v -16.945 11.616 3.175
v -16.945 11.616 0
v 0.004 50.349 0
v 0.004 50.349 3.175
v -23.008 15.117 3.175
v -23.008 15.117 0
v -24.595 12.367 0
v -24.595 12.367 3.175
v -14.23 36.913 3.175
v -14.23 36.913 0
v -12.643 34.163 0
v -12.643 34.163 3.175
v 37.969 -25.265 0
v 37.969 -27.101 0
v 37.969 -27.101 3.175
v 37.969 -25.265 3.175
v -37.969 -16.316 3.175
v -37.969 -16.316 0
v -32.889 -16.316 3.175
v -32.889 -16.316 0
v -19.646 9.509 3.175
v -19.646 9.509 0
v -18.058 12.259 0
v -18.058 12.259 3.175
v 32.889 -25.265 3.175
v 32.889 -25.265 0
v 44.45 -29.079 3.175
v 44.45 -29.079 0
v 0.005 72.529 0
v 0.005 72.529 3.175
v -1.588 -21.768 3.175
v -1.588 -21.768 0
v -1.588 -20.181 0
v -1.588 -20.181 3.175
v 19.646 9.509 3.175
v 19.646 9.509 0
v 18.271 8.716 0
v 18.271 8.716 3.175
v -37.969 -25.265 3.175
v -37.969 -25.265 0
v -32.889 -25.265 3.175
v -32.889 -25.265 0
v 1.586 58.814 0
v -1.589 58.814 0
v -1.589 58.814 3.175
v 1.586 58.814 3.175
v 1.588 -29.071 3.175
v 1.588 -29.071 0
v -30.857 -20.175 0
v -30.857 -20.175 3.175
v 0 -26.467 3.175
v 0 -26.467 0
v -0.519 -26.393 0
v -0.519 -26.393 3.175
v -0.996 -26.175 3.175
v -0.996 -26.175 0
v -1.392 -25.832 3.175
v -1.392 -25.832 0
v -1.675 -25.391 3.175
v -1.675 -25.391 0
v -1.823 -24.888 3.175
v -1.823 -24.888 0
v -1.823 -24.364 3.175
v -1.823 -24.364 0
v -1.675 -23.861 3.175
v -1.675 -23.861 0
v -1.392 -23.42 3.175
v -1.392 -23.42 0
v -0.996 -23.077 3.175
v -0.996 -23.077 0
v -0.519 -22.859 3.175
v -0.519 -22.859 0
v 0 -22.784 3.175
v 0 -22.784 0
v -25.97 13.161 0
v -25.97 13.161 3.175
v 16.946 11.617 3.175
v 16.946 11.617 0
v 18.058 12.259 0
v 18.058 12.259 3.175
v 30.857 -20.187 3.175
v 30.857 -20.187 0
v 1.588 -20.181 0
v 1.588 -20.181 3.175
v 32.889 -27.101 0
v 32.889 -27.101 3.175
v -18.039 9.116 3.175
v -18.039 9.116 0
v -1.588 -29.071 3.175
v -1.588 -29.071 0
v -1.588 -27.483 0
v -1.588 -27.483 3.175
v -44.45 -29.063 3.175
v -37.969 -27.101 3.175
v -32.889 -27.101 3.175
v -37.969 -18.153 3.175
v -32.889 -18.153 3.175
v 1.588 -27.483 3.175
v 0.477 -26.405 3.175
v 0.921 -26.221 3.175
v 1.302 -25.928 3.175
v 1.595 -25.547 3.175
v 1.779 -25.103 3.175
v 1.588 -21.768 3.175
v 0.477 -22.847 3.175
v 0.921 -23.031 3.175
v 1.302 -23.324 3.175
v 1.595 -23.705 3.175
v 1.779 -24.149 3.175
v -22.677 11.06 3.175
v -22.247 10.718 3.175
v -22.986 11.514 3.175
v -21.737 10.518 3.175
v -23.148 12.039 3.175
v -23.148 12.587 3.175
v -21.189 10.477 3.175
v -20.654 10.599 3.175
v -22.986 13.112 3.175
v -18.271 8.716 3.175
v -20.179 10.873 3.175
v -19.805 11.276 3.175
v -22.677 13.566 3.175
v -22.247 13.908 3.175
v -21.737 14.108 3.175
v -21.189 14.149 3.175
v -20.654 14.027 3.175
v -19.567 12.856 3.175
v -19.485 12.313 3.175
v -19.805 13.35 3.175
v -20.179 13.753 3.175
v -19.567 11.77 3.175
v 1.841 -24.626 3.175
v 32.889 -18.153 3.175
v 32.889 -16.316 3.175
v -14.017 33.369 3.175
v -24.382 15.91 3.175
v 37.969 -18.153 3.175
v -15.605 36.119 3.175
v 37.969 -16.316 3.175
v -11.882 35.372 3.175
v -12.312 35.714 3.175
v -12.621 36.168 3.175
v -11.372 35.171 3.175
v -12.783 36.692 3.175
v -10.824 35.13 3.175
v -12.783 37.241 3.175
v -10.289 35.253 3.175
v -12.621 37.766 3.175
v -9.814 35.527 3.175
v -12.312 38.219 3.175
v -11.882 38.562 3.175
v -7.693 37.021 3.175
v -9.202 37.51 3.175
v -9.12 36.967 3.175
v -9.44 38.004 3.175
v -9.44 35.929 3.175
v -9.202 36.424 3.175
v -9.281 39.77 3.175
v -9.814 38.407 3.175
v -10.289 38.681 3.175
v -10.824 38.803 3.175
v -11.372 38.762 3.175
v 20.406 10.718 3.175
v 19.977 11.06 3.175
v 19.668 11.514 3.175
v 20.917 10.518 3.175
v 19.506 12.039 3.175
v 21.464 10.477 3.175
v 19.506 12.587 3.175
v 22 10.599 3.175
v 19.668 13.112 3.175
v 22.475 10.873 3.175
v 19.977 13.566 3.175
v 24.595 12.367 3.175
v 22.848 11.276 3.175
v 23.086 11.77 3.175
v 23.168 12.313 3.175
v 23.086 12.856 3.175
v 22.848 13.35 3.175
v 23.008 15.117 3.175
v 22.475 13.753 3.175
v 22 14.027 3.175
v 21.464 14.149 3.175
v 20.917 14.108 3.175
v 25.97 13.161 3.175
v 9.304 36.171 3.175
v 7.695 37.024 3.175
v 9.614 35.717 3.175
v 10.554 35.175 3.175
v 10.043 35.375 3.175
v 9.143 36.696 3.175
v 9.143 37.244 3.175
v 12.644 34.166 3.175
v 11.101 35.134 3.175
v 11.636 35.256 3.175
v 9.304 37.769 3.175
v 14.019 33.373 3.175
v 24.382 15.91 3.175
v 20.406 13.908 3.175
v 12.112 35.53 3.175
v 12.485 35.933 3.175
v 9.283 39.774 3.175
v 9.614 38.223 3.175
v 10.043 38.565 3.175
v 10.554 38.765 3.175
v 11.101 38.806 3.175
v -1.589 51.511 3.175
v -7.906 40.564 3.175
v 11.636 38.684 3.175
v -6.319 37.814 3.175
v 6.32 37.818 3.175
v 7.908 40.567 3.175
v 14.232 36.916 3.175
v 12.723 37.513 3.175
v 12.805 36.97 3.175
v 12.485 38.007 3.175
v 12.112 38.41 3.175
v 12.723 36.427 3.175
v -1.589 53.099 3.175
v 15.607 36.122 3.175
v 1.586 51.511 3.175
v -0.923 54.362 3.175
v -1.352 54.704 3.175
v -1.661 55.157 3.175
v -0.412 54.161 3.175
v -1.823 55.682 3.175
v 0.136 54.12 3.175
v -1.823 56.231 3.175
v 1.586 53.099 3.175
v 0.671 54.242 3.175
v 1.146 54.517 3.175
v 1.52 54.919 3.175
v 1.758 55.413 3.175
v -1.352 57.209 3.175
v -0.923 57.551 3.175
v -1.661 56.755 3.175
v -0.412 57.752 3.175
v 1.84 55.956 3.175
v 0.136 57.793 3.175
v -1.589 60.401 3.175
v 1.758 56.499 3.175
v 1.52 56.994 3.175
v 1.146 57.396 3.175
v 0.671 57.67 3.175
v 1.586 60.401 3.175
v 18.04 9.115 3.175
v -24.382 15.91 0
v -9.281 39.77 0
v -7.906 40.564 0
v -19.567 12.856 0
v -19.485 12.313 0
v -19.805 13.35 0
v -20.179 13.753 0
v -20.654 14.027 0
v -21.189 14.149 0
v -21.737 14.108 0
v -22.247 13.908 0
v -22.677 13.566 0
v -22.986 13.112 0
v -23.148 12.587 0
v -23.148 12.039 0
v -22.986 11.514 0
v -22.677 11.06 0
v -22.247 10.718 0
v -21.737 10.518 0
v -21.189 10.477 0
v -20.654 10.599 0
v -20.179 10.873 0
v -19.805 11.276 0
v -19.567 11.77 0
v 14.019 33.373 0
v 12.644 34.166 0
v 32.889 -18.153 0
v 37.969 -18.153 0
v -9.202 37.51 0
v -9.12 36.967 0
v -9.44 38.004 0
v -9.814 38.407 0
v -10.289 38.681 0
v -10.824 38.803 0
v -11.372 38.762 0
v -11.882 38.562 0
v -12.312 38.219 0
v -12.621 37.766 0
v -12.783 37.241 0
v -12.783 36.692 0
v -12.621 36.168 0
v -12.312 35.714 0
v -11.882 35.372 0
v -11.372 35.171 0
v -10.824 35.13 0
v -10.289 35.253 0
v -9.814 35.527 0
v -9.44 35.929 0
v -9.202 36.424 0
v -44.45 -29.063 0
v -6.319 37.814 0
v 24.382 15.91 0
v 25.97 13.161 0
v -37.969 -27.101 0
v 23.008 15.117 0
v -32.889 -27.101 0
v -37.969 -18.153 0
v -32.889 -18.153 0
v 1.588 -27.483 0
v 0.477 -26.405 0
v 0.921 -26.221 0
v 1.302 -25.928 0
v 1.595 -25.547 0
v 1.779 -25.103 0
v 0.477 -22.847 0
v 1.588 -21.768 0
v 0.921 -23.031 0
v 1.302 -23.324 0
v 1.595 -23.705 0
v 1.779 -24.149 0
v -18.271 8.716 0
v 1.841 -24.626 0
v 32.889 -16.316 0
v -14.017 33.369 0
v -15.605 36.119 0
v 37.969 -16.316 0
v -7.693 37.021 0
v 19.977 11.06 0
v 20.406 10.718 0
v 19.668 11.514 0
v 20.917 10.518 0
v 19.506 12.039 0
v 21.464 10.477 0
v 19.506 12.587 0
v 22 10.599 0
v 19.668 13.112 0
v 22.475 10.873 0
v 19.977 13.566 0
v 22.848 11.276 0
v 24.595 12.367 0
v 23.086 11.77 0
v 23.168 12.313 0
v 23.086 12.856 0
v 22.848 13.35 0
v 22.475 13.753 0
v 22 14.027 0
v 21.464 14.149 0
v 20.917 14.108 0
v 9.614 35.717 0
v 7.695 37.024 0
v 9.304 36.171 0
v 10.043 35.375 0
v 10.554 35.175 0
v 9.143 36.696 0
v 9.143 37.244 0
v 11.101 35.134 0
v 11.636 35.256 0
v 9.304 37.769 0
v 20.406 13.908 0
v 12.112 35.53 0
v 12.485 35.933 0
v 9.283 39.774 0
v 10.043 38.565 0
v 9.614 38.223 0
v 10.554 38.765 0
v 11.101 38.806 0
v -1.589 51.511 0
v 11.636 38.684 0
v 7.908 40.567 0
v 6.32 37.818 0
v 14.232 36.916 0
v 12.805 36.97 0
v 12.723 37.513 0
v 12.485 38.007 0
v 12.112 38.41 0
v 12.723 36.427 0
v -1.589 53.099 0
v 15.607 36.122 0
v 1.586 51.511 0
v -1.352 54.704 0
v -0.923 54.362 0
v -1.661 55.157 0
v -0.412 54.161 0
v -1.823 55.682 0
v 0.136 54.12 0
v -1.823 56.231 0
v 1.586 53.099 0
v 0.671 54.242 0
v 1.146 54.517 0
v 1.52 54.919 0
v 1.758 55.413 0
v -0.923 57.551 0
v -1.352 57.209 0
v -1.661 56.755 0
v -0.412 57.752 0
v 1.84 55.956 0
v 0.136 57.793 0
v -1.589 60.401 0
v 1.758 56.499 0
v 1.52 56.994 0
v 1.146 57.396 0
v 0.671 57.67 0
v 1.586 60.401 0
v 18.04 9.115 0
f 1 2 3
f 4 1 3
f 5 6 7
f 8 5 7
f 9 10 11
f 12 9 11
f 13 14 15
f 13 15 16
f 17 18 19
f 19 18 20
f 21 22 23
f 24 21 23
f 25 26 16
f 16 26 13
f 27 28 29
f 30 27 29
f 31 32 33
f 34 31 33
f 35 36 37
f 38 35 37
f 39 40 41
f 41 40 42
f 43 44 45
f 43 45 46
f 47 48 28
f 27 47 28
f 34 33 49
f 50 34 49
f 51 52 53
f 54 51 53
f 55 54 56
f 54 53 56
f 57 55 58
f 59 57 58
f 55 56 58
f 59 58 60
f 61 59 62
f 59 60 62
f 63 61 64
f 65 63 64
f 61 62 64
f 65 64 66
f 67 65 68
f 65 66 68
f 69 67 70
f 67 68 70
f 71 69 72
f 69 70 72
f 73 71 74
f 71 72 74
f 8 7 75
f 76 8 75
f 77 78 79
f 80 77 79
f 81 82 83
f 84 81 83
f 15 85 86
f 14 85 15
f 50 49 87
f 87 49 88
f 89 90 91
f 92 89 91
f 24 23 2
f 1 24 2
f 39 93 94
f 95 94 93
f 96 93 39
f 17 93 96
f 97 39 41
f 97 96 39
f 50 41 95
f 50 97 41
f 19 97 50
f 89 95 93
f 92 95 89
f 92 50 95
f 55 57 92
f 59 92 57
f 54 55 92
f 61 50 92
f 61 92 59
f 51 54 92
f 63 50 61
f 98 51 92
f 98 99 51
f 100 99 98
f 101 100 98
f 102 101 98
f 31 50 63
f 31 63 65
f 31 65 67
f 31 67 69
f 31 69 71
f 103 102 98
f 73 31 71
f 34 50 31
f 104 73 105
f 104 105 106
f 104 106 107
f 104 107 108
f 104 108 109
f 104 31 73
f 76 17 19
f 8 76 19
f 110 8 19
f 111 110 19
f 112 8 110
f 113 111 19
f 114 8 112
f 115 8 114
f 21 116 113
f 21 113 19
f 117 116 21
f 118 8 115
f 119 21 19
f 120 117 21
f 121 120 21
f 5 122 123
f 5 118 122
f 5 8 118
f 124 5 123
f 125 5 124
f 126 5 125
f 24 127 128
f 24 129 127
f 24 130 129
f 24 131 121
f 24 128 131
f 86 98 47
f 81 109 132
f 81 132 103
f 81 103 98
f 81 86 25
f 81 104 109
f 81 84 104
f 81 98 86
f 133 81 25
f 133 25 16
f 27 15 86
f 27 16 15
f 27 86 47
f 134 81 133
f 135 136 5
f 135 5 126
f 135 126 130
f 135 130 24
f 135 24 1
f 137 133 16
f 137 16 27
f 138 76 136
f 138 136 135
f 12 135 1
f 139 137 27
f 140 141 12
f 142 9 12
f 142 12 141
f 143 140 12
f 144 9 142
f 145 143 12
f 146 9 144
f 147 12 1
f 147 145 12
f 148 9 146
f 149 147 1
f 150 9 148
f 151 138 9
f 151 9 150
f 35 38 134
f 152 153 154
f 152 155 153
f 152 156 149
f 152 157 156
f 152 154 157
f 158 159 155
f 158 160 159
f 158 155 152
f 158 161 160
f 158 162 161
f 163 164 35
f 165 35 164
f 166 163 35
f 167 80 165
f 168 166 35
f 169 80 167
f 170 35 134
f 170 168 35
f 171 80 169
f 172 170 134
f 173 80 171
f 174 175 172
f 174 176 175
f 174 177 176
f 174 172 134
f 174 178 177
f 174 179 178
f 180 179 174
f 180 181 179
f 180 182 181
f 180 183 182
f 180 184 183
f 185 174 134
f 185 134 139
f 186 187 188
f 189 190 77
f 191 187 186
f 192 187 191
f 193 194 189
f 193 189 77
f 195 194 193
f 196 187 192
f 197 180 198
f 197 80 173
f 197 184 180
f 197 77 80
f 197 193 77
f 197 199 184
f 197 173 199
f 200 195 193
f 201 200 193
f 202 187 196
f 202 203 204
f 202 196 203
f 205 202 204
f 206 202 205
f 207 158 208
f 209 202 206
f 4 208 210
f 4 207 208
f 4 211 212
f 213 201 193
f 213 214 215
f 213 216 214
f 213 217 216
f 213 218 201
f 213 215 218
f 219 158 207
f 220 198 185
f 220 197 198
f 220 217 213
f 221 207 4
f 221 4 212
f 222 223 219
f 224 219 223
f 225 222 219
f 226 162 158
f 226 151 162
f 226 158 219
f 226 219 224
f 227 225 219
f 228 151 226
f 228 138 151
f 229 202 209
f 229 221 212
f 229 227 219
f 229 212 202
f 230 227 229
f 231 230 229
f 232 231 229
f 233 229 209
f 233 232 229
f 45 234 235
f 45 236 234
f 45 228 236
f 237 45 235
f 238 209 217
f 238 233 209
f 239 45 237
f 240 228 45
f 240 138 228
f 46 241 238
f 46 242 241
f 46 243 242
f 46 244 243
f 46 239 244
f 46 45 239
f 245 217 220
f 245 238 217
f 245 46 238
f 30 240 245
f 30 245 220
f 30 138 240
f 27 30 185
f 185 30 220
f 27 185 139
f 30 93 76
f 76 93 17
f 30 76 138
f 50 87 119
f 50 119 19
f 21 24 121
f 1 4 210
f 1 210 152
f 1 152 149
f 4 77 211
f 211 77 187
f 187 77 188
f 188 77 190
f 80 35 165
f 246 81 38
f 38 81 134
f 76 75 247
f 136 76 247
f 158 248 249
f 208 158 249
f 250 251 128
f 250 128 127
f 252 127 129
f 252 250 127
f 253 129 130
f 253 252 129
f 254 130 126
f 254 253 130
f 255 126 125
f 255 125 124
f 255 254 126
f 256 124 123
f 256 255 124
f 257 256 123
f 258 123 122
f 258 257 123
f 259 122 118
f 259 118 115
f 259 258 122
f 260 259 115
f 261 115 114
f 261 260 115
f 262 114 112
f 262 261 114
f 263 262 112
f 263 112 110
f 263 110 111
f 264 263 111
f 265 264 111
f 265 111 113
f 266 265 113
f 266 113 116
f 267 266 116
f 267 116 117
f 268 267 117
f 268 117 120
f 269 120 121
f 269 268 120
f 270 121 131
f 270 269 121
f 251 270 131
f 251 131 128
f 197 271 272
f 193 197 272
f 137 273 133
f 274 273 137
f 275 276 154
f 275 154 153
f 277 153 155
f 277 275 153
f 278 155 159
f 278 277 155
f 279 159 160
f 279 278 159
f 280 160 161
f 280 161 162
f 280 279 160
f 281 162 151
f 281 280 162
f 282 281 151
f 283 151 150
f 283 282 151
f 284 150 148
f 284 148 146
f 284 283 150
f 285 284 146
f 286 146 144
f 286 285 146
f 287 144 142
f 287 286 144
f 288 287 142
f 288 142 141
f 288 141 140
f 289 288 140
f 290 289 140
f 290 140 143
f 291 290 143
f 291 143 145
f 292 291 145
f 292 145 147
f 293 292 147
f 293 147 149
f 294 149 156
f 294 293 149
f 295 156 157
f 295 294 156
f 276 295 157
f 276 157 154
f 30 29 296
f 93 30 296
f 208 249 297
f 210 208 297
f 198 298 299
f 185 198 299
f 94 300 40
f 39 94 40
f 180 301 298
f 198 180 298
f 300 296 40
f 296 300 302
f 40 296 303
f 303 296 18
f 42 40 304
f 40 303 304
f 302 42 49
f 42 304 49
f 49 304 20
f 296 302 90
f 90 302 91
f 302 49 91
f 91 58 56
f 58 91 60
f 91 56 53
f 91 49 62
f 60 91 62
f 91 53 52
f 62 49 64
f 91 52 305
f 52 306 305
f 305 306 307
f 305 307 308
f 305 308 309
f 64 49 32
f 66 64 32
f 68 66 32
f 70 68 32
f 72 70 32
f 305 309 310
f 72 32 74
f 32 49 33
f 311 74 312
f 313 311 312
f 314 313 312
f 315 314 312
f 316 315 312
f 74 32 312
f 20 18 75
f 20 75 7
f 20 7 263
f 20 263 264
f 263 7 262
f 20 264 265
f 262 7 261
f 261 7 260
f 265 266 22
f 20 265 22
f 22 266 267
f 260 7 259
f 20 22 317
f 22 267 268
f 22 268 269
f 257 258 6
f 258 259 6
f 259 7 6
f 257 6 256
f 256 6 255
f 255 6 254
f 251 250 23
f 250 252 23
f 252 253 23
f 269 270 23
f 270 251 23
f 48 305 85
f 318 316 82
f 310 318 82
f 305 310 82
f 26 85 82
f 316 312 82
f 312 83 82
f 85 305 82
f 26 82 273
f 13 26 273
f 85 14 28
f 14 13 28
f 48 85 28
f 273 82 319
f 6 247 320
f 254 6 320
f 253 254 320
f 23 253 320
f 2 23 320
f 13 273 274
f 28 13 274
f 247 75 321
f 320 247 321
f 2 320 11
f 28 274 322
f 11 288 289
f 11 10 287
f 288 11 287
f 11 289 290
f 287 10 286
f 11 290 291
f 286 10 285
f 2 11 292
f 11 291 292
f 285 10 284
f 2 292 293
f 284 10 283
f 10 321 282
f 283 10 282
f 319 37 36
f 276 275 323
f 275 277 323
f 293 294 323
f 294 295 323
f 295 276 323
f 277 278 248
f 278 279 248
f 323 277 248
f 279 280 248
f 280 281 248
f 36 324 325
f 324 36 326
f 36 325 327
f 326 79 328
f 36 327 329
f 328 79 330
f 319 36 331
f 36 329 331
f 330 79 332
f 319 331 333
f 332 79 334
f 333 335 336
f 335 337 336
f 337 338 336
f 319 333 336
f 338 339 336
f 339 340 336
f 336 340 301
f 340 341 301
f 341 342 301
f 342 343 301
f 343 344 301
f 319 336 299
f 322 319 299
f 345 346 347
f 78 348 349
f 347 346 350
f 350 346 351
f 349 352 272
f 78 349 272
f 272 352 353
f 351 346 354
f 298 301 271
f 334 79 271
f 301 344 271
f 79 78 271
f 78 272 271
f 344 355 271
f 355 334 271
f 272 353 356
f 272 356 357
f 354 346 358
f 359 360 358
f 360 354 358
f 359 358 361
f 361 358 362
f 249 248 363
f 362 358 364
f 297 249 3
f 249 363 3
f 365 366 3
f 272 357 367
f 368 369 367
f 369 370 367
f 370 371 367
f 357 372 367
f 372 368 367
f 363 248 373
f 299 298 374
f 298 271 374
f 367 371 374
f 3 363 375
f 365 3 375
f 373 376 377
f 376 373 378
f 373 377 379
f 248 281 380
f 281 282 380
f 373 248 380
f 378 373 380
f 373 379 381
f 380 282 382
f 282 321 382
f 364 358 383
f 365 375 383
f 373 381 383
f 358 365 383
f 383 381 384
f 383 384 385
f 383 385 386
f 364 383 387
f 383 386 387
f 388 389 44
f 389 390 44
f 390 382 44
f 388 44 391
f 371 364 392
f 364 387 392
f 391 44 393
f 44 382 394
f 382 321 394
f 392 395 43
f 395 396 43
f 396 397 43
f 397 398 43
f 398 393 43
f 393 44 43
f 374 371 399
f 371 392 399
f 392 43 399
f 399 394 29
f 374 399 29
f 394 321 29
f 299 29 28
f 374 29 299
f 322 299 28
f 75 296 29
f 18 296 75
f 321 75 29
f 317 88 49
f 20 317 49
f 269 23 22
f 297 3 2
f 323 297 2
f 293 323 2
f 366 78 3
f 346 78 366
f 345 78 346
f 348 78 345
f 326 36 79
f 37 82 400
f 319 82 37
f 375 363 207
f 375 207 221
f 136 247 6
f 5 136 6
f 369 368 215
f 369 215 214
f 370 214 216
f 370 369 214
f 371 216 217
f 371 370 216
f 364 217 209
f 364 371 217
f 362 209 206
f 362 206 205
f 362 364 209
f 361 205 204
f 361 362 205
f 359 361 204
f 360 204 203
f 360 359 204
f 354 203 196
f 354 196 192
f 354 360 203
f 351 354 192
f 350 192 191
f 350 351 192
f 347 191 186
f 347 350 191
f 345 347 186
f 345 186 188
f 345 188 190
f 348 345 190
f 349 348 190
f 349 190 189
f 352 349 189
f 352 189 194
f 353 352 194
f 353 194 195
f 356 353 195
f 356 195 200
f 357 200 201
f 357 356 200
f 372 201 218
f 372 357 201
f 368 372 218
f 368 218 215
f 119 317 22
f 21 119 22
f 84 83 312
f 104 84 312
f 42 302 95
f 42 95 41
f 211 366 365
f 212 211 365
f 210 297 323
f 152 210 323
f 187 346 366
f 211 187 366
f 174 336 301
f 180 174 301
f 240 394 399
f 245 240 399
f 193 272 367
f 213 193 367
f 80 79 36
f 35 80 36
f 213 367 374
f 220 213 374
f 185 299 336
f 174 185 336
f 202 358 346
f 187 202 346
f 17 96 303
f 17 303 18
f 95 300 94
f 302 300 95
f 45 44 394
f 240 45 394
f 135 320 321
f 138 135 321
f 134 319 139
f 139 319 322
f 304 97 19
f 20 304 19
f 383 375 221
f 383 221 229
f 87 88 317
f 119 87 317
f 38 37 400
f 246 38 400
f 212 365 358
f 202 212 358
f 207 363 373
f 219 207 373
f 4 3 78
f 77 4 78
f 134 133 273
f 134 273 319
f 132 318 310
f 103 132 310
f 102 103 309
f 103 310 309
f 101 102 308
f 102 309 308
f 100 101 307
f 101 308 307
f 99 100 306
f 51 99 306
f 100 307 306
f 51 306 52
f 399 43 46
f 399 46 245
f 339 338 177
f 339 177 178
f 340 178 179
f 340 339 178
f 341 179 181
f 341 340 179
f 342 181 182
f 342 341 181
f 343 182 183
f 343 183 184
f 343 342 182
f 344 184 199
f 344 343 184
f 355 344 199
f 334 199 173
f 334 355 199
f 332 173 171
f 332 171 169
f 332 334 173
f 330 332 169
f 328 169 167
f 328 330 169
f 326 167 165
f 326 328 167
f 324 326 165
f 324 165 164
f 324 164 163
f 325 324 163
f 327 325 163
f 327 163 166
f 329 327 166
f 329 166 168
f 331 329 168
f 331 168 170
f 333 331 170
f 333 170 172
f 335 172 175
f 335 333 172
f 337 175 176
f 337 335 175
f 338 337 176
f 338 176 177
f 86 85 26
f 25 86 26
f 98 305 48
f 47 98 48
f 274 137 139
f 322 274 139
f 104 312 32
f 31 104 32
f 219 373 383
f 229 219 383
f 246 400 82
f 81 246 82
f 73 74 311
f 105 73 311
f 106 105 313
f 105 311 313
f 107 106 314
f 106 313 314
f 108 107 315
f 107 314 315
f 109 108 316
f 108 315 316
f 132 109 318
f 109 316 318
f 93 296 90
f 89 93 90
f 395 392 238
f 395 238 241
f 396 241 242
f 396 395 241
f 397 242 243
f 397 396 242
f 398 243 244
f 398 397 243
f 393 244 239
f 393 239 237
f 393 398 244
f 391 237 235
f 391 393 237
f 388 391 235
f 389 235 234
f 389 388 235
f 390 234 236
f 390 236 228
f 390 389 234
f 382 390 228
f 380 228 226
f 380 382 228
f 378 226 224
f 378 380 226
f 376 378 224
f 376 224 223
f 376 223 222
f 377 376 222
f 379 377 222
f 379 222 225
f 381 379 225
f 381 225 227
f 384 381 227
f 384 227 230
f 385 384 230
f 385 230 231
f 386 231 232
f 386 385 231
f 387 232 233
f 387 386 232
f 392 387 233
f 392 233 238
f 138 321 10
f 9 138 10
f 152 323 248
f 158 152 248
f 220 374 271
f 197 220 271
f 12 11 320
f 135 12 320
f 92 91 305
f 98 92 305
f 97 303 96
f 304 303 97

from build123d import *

# Parameters (mm, degrees)
F0_W     = 5.08
F0_H     = 1.836467
F0_H_2   = 1.836468
F0_R     = 1.8415
F0_W_2   = 3.175
F0_H_3   = 1.5875
F1_DEPTH = 3.175


with BuildPart() as f1:
    # F0 (on Top) → F1 (new body)
    with BuildSketch(Plane.XY):
        Polygon((1.5875, -29.071287), (44.449999, -29.079242), (0.005395, 72.529008), (-44.449999, -29.062744), (-1.5875, -29.070698), (-1.5875, -27.483493), (0, -27.483493), (1.5875, -27.483493), align=None)
        with Locations((-35.429051, -26.18307)):
            Rectangle(F0_W, F0_H, mode=Mode.SUBTRACT)
        with Locations((-35.429051, -17.234603)):
            Rectangle(F0_W, F0_H_2, mode=Mode.SUBTRACT)
        with BuildLine():
            ThreePointArc((1.8415, -24.625993), (1.302137, -25.92813), (0, -26.467493))
            ThreePointArc((0, -26.467493), (-1.8415, -24.625993), (0, -22.784493))
            ThreePointArc((0, -22.784493), (1.302137, -23.323855), (1.8415, -24.625993))
        make_face(mode=Mode.SUBTRACT)
        Polygon((-24.382213, 15.910164), (-23.007653, 15.116562), (-24.595153, 12.366931), (-25.969713, 13.160534), align=None, mode=Mode.SUBTRACT)
        with Locations((-21.326735, 12.312996)):
            Circle(F0_R, mode=Mode.SUBTRACT)
        Polygon((1.5875, -21.768493), (0, -21.768493), (-1.5875, -21.768493), (-1.5875, -20.180698), (-30.857051, -20.175266), (-18.039491, 9.116081), (-18.270747, 8.715534), (-19.645818, 9.509431), (-18.058318, 12.259062), (-16.945342, 11.616485), (0.003745, 50.349411), (16.945842, 11.616773), (18.058318, 12.259062), (19.645818, 9.509431), (18.270747, 8.715534), (18.040242, 9.11478), (30.857051, -20.186719), (1.5875, -20.181287), align=None, mode=Mode.SUBTRACT)
        with Locations((35.429051, -26.18307)):
            Rectangle(F0_W, F0_H, mode=Mode.SUBTRACT)
        with Locations((35.429051, -17.234603)):
            Rectangle(F0_W, F0_H_2, mode=Mode.SUBTRACT)
        with Locations((21.326735, 12.312996)):
            Circle(F0_R, mode=Mode.SUBTRACT)
        Polygon((25.969713, 13.160534), (24.595153, 12.366931), (23.007653, 15.116562), (24.382213, 15.910164), align=None, mode=Mode.SUBTRACT)
        Polygon((-12.642652, 34.163247), (-14.017468, 33.369497), (-15.604968, 36.119127), (-14.230152, 36.912878), align=None, mode=Mode.SUBTRACT)
        with Locations((-10.961735, 36.966812)):
            Circle(F0_R, mode=Mode.SUBTRACT)
        Polygon((-6.318502, 37.814497), (-7.693317, 37.020747), (-9.280817, 39.770378), (-7.906002, 40.564128), align=None, mode=Mode.SUBTRACT)
        with Locations((-0.001844, 52.305038)):
            Rectangle(F0_W_2, F0_H_3, mode=Mode.SUBTRACT)
        with Locations((-0.001844, 55.956288)):
            Circle(F0_R, mode=Mode.SUBTRACT)
        with Locations((-0.001844, 59.607538)):
            Rectangle(F0_W_2, F0_H_3, mode=Mode.SUBTRACT)
        with Locations((10.963579, 36.970006)):
            Circle(F0_R, mode=Mode.SUBTRACT)
        Polygon((7.907846, 40.567321), (9.282661, 39.773571), (7.695161, 37.023941), (6.320346, 37.817691), align=None, mode=Mode.SUBTRACT)
        Polygon((14.231996, 36.916071), (15.606812, 36.122321), (14.019312, 33.372691), (12.644496, 34.166441), align=None, mode=Mode.SUBTRACT)
    extrude(amount=F1_DEPTH)


solid = f1.part
